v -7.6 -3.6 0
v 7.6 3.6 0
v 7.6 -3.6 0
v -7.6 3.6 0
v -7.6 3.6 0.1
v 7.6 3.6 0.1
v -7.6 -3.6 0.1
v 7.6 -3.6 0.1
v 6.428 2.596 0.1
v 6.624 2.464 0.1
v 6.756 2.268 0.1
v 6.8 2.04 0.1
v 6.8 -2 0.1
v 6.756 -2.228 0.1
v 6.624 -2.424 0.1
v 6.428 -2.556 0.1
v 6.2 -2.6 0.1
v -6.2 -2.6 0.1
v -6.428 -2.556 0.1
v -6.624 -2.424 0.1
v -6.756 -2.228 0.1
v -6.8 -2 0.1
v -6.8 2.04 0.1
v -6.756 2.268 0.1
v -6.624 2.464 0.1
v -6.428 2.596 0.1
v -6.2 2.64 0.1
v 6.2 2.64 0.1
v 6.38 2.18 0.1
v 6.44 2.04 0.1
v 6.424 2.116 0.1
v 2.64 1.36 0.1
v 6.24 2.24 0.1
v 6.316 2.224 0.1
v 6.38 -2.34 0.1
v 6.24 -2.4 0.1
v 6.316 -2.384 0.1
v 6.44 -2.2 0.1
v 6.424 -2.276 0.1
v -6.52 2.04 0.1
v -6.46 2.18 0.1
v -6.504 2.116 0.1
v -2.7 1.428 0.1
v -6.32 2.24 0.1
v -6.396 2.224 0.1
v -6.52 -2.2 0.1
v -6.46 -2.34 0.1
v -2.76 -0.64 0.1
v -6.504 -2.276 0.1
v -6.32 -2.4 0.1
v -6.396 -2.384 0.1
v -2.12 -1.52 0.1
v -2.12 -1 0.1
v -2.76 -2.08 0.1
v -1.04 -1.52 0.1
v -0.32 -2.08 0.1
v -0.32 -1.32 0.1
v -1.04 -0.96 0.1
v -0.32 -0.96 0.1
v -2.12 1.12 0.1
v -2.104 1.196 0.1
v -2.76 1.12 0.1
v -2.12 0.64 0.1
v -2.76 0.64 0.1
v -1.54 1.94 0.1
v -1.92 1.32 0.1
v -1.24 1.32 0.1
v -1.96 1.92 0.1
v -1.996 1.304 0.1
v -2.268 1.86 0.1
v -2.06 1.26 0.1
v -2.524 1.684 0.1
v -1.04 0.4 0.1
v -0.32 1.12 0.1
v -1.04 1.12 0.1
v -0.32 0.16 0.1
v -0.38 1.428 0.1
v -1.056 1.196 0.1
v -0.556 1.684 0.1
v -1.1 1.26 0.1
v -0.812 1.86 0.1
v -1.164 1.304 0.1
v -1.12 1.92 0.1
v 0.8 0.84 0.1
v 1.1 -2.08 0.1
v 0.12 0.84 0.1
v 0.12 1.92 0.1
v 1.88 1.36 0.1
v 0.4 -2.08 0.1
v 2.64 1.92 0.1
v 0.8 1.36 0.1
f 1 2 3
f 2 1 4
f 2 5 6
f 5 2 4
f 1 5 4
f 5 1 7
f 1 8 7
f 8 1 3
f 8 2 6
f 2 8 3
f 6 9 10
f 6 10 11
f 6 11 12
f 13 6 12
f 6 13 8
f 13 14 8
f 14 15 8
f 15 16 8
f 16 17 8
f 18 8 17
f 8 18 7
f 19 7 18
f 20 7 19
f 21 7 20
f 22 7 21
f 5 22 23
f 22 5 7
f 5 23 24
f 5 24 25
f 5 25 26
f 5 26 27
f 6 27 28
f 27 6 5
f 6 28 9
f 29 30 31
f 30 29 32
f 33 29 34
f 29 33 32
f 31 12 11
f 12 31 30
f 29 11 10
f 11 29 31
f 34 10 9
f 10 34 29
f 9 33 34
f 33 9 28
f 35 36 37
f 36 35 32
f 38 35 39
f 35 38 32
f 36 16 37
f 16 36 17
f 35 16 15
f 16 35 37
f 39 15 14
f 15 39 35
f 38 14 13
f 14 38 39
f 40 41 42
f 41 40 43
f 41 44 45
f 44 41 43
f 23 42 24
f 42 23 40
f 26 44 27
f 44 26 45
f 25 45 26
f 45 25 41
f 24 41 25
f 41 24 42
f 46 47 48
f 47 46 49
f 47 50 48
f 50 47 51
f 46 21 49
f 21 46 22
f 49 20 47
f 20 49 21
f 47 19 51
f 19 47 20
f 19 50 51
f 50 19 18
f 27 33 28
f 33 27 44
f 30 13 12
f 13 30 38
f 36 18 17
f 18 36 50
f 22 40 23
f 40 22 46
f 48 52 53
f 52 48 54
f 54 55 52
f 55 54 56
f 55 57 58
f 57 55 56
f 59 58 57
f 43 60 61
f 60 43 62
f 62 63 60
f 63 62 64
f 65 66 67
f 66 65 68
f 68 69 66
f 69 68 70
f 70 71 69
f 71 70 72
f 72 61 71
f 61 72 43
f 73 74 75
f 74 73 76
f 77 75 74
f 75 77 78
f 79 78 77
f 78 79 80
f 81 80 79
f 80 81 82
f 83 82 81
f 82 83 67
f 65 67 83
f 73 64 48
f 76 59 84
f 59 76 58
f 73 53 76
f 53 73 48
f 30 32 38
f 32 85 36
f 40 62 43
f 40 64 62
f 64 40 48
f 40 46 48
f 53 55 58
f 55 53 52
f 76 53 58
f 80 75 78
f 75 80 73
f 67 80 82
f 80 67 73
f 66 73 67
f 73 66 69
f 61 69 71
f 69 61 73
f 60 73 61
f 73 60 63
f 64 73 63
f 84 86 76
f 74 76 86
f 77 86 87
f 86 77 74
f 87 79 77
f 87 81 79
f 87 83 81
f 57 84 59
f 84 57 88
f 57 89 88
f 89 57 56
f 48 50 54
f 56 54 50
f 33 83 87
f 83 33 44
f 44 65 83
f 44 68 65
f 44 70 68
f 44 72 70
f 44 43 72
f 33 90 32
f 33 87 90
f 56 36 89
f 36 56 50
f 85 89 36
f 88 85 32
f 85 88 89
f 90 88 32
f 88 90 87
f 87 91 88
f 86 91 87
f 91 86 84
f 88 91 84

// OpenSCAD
// file: ../p/box5-12.scad
use <../lib.scad>
function ldraw_lib__box5_12() = [
// 0 Box with 5 Faces without Any Edges
// 0 Name: box5-12.dat
// 0 Author: Chris Dee [cwdee]
// 0 !LDRAW_ORG Primitive UPDATE 2009-02
// 0 !LICENSE Licensed under CC BY 4.0 : see CAreadme.txt
// 
// 0 BFC CERTIFY CCW
  [0,"BFC","CERTIFY"],
  [0,"BFC","CCW"],
// 
// 0 !HISTORY 2009-09-03 [PTadmin] Official Update 2009-02
// 
// 
// 4 16 1 1 1 1 1 -1 -1 1 -1 -1 1 1
  [4,16,1,1,1,1,1,-1,-1,1,-1,-1,1,1],
// 4 16 -1 0 1 1 0 1 1 1 1 -1 1 1
  [4,16,-1,0,1,1,0,1,1,1,1,-1,1,1],
// 4 16 -1 0 -1 -1 0 1 -1 1 1 -1 1 -1
  [4,16,-1,0,-1,-1,0,1,-1,1,1,-1,1,-1],
// 4 16 1 0 -1 -1 0 -1 -1 1 -1 1 1 -1
  [4,16,1,0,-1,-1,0,-1,-1,1,-1,1,1,-1],
// 4 16 1 0 1 1 0 -1 1 1 -1 1 1 1
  [4,16,1,0,1,1,0,-1,1,1,-1,1,1,1],
// 0
];
module ldraw_lib__box5_12(step=0, col=false, unit=2/5, alt=false, line=0.2, solid=!$preview)
    makepoly(ldraw_lib__box5_12(), step=step, col=col, unit=unit, alt=alt, line=line, solid=solid);
ldraw_lib__box5_12(line=0.2);
// main file
use <../lib.scad>
use <../p/box5-12.scad>
function ldraw_lib__4174735f() = [
// 0 Sticker  0.9 x  1.9 with White "27" on Black Background with Silver Outline
// 0 Name: 4174735f.dat
// 0 Author: Gerald Lasser [GeraldLasser]
// 0 !LDRAW_ORG Part UPDATE 2024-04
// 0 !LICENSE Licensed under CC BY 4.0 : see CAreadme.txt
// 
// 0 BFC CERTIFY CCW
  [0,"BFC","CERTIFY"],
  [0,"BFC","CCW"],
// 
// 0 !KEYWORDS santa fe, Set 10020
// 
// 0 !HISTORY 2024-05-28 [OrionP] Official Update 2024-04
// 
// 
// 1 16 0 -0.25 0 19 0 0 0 0.25 0 0 0 9 box5-12.dat
  [1,16,0,-0.25,0,19,0,0,0,0.25,0,0,0,9, ldraw_lib__box5_12()],
// 
// 3 16 19 -.25 9 16.07 -.25 6.49 16.56 -.25 6.16
  [3,16,19,-.25,9,16.07,-.25,6.49,16.56,-.25,6.16],
// 3 16 19 -.25 9 16.56 -.25 6.16 16.89 -.25 5.67
  [3,16,19,-.25,9,16.56,-.25,6.16,16.89,-.25,5.67],
// 3 16 19 -.25 9 16.89 -.25 5.67 17 -.25 5.1
  [3,16,19,-.25,9,16.89,-.25,5.67,17,-.25,5.1],
// 4 16 19 -.25 9 17 -.25 5.1 17 -.25 -5 19 -.25 -9
  [4,16,19,-.25,9,17,-.25,5.1,17,-.25,-5,19,-.25,-9],
// 3 16 17 -.25 -5 16.89 -.25 -5.57 19 -.25 -9
  [3,16,17,-.25,-5,16.89,-.25,-5.57,19,-.25,-9],
// 3 16 16.89 -.25 -5.57 16.56 -.25 -6.06 19 -.25 -9
  [3,16,16.89,-.25,-5.57,16.56,-.25,-6.06,19,-.25,-9],
// 3 16 16.56 -.25 -6.06 16.07 -.25 -6.39 19 -.25 -9
  [3,16,16.56,-.25,-6.06,16.07,-.25,-6.39,19,-.25,-9],
// 3 16 16.07 -.25 -6.39 15.5 -.25 -6.5 19 -.25 -9
  [3,16,16.07,-.25,-6.39,15.5,-.25,-6.5,19,-.25,-9],
// 4 16 19 -.25 -9 15.5 -.25 -6.5 -15.5 -.25 -6.5 -19 -.25 -9
  [4,16,19,-.25,-9,15.5,-.25,-6.5,-15.5,-.25,-6.5,-19,-.25,-9],
// 3 16 -16.07 -.25 -6.39 -19 -.25 -9 -15.5 -.25 -6.5
  [3,16,-16.07,-.25,-6.39,-19,-.25,-9,-15.5,-.25,-6.5],
// 3 16 -16.56 -.25 -6.06 -19 -.25 -9 -16.07 -.25 -6.39
  [3,16,-16.56,-.25,-6.06,-19,-.25,-9,-16.07,-.25,-6.39],
// 3 16 -16.89 -.25 -5.57 -19 -.25 -9 -16.56 -.25 -6.06
  [3,16,-16.89,-.25,-5.57,-19,-.25,-9,-16.56,-.25,-6.06],
// 3 16 -17 -.25 -5 -19 -.25 -9 -16.89 -.25 -5.57
  [3,16,-17,-.25,-5,-19,-.25,-9,-16.89,-.25,-5.57],
// 4 16 -19 -.25 -9 -17 -.25 -5 -17 -.25 5.1 -19 -.25 9
  [4,16,-19,-.25,-9,-17,-.25,-5,-17,-.25,5.1,-19,-.25,9],
// 3 16 -19 -.25 9 -17 -.25 5.1 -16.89 -.25 5.67
  [3,16,-19,-.25,9,-17,-.25,5.1,-16.89,-.25,5.67],
// 3 16 -19 -.25 9 -16.89 -.25 5.67 -16.56 -.25 6.16
  [3,16,-19,-.25,9,-16.89,-.25,5.67,-16.56,-.25,6.16],
// 3 16 -19 -.25 9 -16.56 -.25 6.16 -16.07 -.25 6.49
  [3,16,-19,-.25,9,-16.56,-.25,6.16,-16.07,-.25,6.49],
// 3 16 -19 -.25 9 -16.07 -.25 6.49 -15.5 -.25 6.6
  [3,16,-19,-.25,9,-16.07,-.25,6.49,-15.5,-.25,6.6],
// 4 16 19 -.25 9 -19 -.25 9 -15.5 -.25 6.6 15.5 -.25 6.6
  [4,16,19,-.25,9,-19,-.25,9,-15.5,-.25,6.6,15.5,-.25,6.6],
// 3 16 19 -.25 9 15.5 -.25 6.6 16.07 -.25 6.49
  [3,16,19,-.25,9,15.5,-.25,6.6,16.07,-.25,6.49],
// 
// 0 BFC NOCLIP
  [0,"BFC","NOCLIP"],
// 4 0 6.6 -.25 3.4 16.1 -.25 5.1 16.06 -.25 5.29 15.95 -.25 5.45
  [4,0,6.6,-.25,3.4,16.1,-.25,5.1,16.06,-.25,5.29,15.95,-.25,5.45],
// 4 0 6.6 -.25 3.4 15.95 -.25 5.45 15.79 -.25 5.56 15.6 -.25 5.6
  [4,0,6.6,-.25,3.4,15.95,-.25,5.45,15.79,-.25,5.56,15.6,-.25,5.6],
// 4 80 16.06 -.25 5.29 16.1 -.25 5.1 17 -.25 5.1 16.89 -.25 5.67
  [4,80,16.06,-.25,5.29,16.1,-.25,5.1,17,-.25,5.1,16.89,-.25,5.67],
// 4 80 15.95 -.25 5.45 16.06 -.25 5.29 16.89 -.25 5.67 16.56 -.25 6.16
  [4,80,15.95,-.25,5.45,16.06,-.25,5.29,16.89,-.25,5.67,16.56,-.25,6.16],
// 4 80 15.79 -.25 5.56 15.95 -.25 5.45 16.56 -.25 6.16 16.07 -.25 6.49
  [4,80,15.79,-.25,5.56,15.95,-.25,5.45,16.56,-.25,6.16,16.07,-.25,6.49],
// 4 80 15.6 -.25 5.6 15.79 -.25 5.56 16.07 -.25 6.49 15.5 -.25 6.6
  [4,80,15.6,-.25,5.6,15.79,-.25,5.56,16.07,-.25,6.49,15.5,-.25,6.6],
// 4 0 6.6 -.25 3.4 15.6 -.25 -6 15.79 -.25 -5.96 15.95 -.25 -5.85
  [4,0,6.6,-.25,3.4,15.6,-.25,-6,15.79,-.25,-5.96,15.95,-.25,-5.85],
// 4 0 6.6 -.25 3.4 15.95 -.25 -5.85 16.06 -.25 -5.69 16.1 -.25 -5.5
  [4,0,6.6,-.25,3.4,15.95,-.25,-5.85,16.06,-.25,-5.69,16.1,-.25,-5.5],
// 4 80 15.79 -.25 -5.96 15.6 -.25 -6 15.5 -.25 -6.5 16.07 -.25 -6.39
  [4,80,15.79,-.25,-5.96,15.6,-.25,-6,15.5,-.25,-6.5,16.07,-.25,-6.39],
// 4 80 15.95 -.25 -5.85 15.79 -.25 -5.96 16.07 -.25 -6.39 16.56 -.25 -6.06
  [4,80,15.95,-.25,-5.85,15.79,-.25,-5.96,16.07,-.25,-6.39,16.56,-.25,-6.06],
// 4 80 16.06 -.25 -5.69 15.95 -.25 -5.85 16.56 -.25 -6.06 16.89 -.25 -5.57
  [4,80,16.06,-.25,-5.69,15.95,-.25,-5.85,16.56,-.25,-6.06,16.89,-.25,-5.57],
// 4 80 16.1 -.25 -5.5 16.06 -.25 -5.69 16.89 -.25 -5.57 17 -.25 -5
  [4,80,16.1,-.25,-5.5,16.06,-.25,-5.69,16.89,-.25,-5.57,17,-.25,-5],
// 4 0 -16.26 -.25 5.29 -16.3 -.25 5.1 -6.75 -.25 3.57 -16.15 -.25 5.45
  [4,0,-16.26,-.25,5.29,-16.3,-.25,5.1,-6.75,-.25,3.57,-16.15,-.25,5.45],
// 4 0 -6.75 -.25 3.57 -15.8 -.25 5.6 -15.99 -.25 5.56 -16.15 -.25 5.45
  [4,0,-6.75,-.25,3.57,-15.8,-.25,5.6,-15.99,-.25,5.56,-16.15,-.25,5.45],
// 4 80 -16.3 -.25 5.1 -16.26 -.25 5.29 -16.89 -.25 5.67 -17 -.25 5.1
  [4,80,-16.3,-.25,5.1,-16.26,-.25,5.29,-16.89,-.25,5.67,-17,-.25,5.1],
// 4 80 -15.99 -.25 5.56 -15.8 -.25 5.6 -15.5 -.25 6.6 -16.07 -.25 6.49
  [4,80,-15.99,-.25,5.56,-15.8,-.25,5.6,-15.5,-.25,6.6,-16.07,-.25,6.49],
// 4 80 -16.15 -.25 5.45 -15.99 -.25 5.56 -16.07 -.25 6.49 -16.56 -.25 6.16
  [4,80,-16.15,-.25,5.45,-15.99,-.25,5.56,-16.07,-.25,6.49,-16.56,-.25,6.16],
// 4 80 -16.26 -.25 5.29 -16.15 -.25 5.45 -16.56 -.25 6.16 -16.89 -.25 5.67
  [4,80,-16.26,-.25,5.29,-16.15,-.25,5.45,-16.56,-.25,6.16,-16.89,-.25,5.67],
// 4 0 -6.9 -.25 -1.6 -16.3 -.25 -5.5 -16.26 -.25 -5.69 -16.15 -.25 -5.85
  [4,0,-6.9,-.25,-1.6,-16.3,-.25,-5.5,-16.26,-.25,-5.69,-16.15,-.25,-5.85],
// 4 0 -6.9 -.25 -1.6 -16.15 -.25 -5.85 -15.99 -.25 -5.96 -15.8 -.25 -6
  [4,0,-6.9,-.25,-1.6,-16.15,-.25,-5.85,-15.99,-.25,-5.96,-15.8,-.25,-6],
// 4 80 -16.26 -.25 -5.69 -16.3 -.25 -5.5 -17 -.25 -5 -16.89 -.25 -5.57
  [4,80,-16.26,-.25,-5.69,-16.3,-.25,-5.5,-17,-.25,-5,-16.89,-.25,-5.57],
// 4 80 -16.15 -.25 -5.85 -16.26 -.25 -5.69 -16.89 -.25 -5.57 -16.56 -.25 -6.06
  [4,80,-16.15,-.25,-5.85,-16.26,-.25,-5.69,-16.89,-.25,-5.57,-16.56,-.25,-6.06],
// 4 80 -15.99 -.25 -5.96 -16.15 -.25 -5.85 -16.56 -.25 -6.06 -16.07 -.25 -6.39
  [4,80,-15.99,-.25,-5.96,-16.15,-.25,-5.85,-16.56,-.25,-6.06,-16.07,-.25,-6.39],
// 4 80 -15.8 -.25 -6 -15.99 -.25 -5.96 -16.07 -.25 -6.39 -15.5 -.25 -6.5
  [4,80,-15.8,-.25,-6,-15.99,-.25,-5.96,-16.07,-.25,-6.39,-15.5,-.25,-6.5],
// 4 80 15.5 -.25 6.6 -15.5 -.25 6.6 -15.8 -.25 5.6 15.6 -.25 5.6
  [4,80,15.5,-.25,6.6,-15.5,-.25,6.6,-15.8,-.25,5.6,15.6,-.25,5.6],
// 4 80 17 -.25 5.1 16.1 -.25 5.1 16.1 -.25 -5.5 17 -.25 -5
  [4,80,17,-.25,5.1,16.1,-.25,5.1,16.1,-.25,-5.5,17,-.25,-5],
// 4 80 15.5 -.25 -6.5 15.6 -.25 -6 -15.8 -.25 -6 -15.5 -.25 -6.5
  [4,80,15.5,-.25,-6.5,15.6,-.25,-6,-15.8,-.25,-6,-15.5,-.25,-6.5],
// 4 80 -17 -.25 -5 -16.3 -.25 -5.5 -16.3 -.25 5.1 -17 -.25 5.1
  [4,80,-17,-.25,-5,-16.3,-.25,-5.5,-16.3,-.25,5.1,-17,-.25,5.1],
// 4 15 -5.3 -.25 -3.8 -5.3 -.25 -2.5 -6.9 -.25 -1.6 -6.9 -.25 -5.2
  [4,15,-5.3,-.25,-3.8,-5.3,-.25,-2.5,-6.9,-.25,-1.6,-6.9,-.25,-5.2],
// 4 15 -5.3 -.25 -3.8 -6.9 -.25 -5.2 -.8 -.25 -5.2 -2.6 -.25 -3.8
  [4,15,-5.3,-.25,-3.8,-6.9,-.25,-5.2,-.8,-.25,-5.2,-2.6,-.25,-3.8],
// 4 15 -2.6 -.25 -3.8 -.8 -.25 -5.2 -.8 -.25 -3.3 -2.6 -.25 -2.4
  [4,15,-2.6,-.25,-3.8,-.8,-.25,-5.2,-.8,-.25,-3.3,-2.6,-.25,-2.4],
// 3 15 -.8 -.25 -2.4 -2.6 -.25 -2.4 -.8 -.25 -3.3
  [3,15,-.8,-.25,-2.4,-2.6,-.25,-2.4,-.8,-.25,-3.3],
// 4 15 -5.3 -.25 2.8 -5.26 -.25 2.99 -6.75 -.25 3.57 -6.9 -.25 2.8
  [4,15,-5.3,-.25,2.8,-5.26,-.25,2.99,-6.75,-.25,3.57,-6.9,-.25,2.8],
// 4 15 -5.3 -.25 1.6 -5.3 -.25 2.8 -6.9 -.25 2.8 -6.9 -.25 1.6
  [4,15,-5.3,-.25,1.6,-5.3,-.25,2.8,-6.9,-.25,2.8,-6.9,-.25,1.6],
// 4 15 -4.8 -.25 3.3 -3.1 -.25 3.3 -3.85 -.25 4.85 -4.9 -.25 4.8
  [4,15,-4.8,-.25,3.3,-3.1,-.25,3.3,-3.85,-.25,4.85,-4.9,-.25,4.8],
// 4 15 -4.99 -.25 3.26 -4.8 -.25 3.3 -4.9 -.25 4.8 -5.67 -.25 4.65
  [4,15,-4.99,-.25,3.26,-4.8,-.25,3.3,-4.9,-.25,4.8,-5.67,-.25,4.65],
// 4 15 -5.15 -.25 3.15 -4.99 -.25 3.26 -5.67 -.25 4.65 -6.31 -.25 4.21
  [4,15,-5.15,-.25,3.15,-4.99,-.25,3.26,-5.67,-.25,4.65,-6.31,-.25,4.21],
// 4 15 -5.26 -.25 2.99 -5.15 -.25 3.15 -6.31 -.25 4.21 -6.75 -.25 3.57
  [4,15,-5.26,-.25,2.99,-5.15,-.25,3.15,-6.31,-.25,4.21,-6.75,-.25,3.57],
// 4 15 -2.6 -.25 2.8 -2.6 -.25 1 -.8 -.25 .4 -.8 -.25 2.8
  [4,15,-2.6,-.25,2.8,-2.6,-.25,1,-.8,-.25,.4,-.8,-.25,2.8],
// 4 15 -2.64 -.25 2.99 -2.6 -.25 2.8 -.8 -.25 2.8 -.95 -.25 3.57
  [4,15,-2.64,-.25,2.99,-2.6,-.25,2.8,-.8,-.25,2.8,-.95,-.25,3.57],
// 4 15 -2.75 -.25 3.15 -2.64 -.25 2.99 -.95 -.25 3.57 -1.39 -.25 4.21
  [4,15,-2.75,-.25,3.15,-2.64,-.25,2.99,-.95,-.25,3.57,-1.39,-.25,4.21],
// 4 15 -2.91 -.25 3.26 -2.75 -.25 3.15 -1.39 -.25 4.21 -2.03 -.25 4.65
  [4,15,-2.91,-.25,3.26,-2.75,-.25,3.15,-1.39,-.25,4.21,-2.03,-.25,4.65],
// 4 15 -3.1 -.25 3.3 -2.91 -.25 3.26 -2.03 -.25 4.65 -2.8 -.25 4.8
  [4,15,-3.1,-.25,3.3,-2.91,-.25,3.26,-2.03,-.25,4.65,-2.8,-.25,4.8],
// 3 15 -3.85 -.25 4.85 -3.1 -.25 3.3 -2.8 -.25 4.8
  [3,15,-3.85,-.25,4.85,-3.1,-.25,3.3,-2.8,-.25,4.8],
// 3 0 -2.6 -.25 1 -6.9 -.25 1.6 -6.9 -.25 -1.6
  [3,0,-2.6,-.25,1,-6.9,-.25,1.6,-6.9,-.25,-1.6],
// 4 0 -.8 -.25 .4 -2.6 -.25 -2.4 -.8 -.25 -2.4 2 -.25 2.1
  [4,0,-.8,-.25,.4,-2.6,-.25,-2.4,-.8,-.25,-2.4,2,-.25,2.1],
// 4 15 -.8 -.25 .4 -2.6 -.25 1 -6.9 -.25 -1.6 -5.3 -.25 -2.5
  [4,15,-.8,-.25,.4,-2.6,-.25,1,-6.9,-.25,-1.6,-5.3,-.25,-2.5],
// 3 0 16.1 -.25 5.1 6.6 -.25 3.4 16.1 -.25 -5.5
  [3,0,16.1,-.25,5.1,6.6,-.25,3.4,16.1,-.25,-5.5],
// 3 0 6.6 -.25 3.4 2.75 -.25 -5.2 15.6 -.25 -6
  [3,0,6.6,-.25,3.4,2.75,-.25,-5.2,15.6,-.25,-6],
// 3 0 -16.3 -.25 5.1 -6.9 -.25 2.8 -6.75 -.25 3.57
  [3,0,-16.3,-.25,5.1,-6.9,-.25,2.8,-6.75,-.25,3.57],
// 3 0 -16.3 -.25 5.1 -6.9 -.25 1.6 -6.9 -.25 2.8
  [3,0,-16.3,-.25,5.1,-6.9,-.25,1.6,-6.9,-.25,2.8],
// 3 0 -6.9 -.25 1.6 -16.3 -.25 5.1 -6.9 -.25 -1.6
  [3,0,-6.9,-.25,1.6,-16.3,-.25,5.1,-6.9,-.25,-1.6],
// 3 0 -16.3 -.25 5.1 -16.3 -.25 -5.5 -6.9 -.25 -1.6
  [3,0,-16.3,-.25,5.1,-16.3,-.25,-5.5,-6.9,-.25,-1.6],
// 4 0 -5.3 -.25 -3.8 -2.6 -.25 -3.8 -2.6 -.25 -2.4 -5.3 -.25 -2.5
  [4,0,-5.3,-.25,-3.8,-2.6,-.25,-3.8,-2.6,-.25,-2.4,-5.3,-.25,-2.5],
// 3 0 -.8 -.25 .4 -5.3 -.25 -2.5 -2.6 -.25 -2.4
  [3,0,-.8,-.25,.4,-5.3,-.25,-2.5,-2.6,-.25,-2.4],
// 4 0 -2.6 -.25 1 -2.6 -.25 2.8 -2.64 -.25 2.99 -2.75 -.25 3.15
  [4,0,-2.6,-.25,1,-2.6,-.25,2.8,-2.64,-.25,2.99,-2.75,-.25,3.15],
// 4 0 -2.6 -.25 1 -2.75 -.25 3.15 -2.91 -.25 3.26 -3.1 -.25 3.3
  [4,0,-2.6,-.25,1,-2.75,-.25,3.15,-2.91,-.25,3.26,-3.1,-.25,3.3],
// 4 0 -2.6 -.25 1 -3.1 -.25 3.3 -4.8 -.25 3.3 -4.99 -.25 3.26
  [4,0,-2.6,-.25,1,-3.1,-.25,3.3,-4.8,-.25,3.3,-4.99,-.25,3.26],
// 4 0 -2.6 -.25 1 -4.99 -.25 3.26 -5.15 -.25 3.15 -5.26 -.25 2.99
  [4,0,-2.6,-.25,1,-4.99,-.25,3.26,-5.15,-.25,3.15,-5.26,-.25,2.99],
// 4 0 -2.6 -.25 1 -5.26 -.25 2.99 -5.3 -.25 2.8 -5.3 -.25 1.6
  [4,0,-2.6,-.25,1,-5.26,-.25,2.99,-5.3,-.25,2.8,-5.3,-.25,1.6],
// 3 0 -6.9 -.25 1.6 -2.6 -.25 1 -5.3 -.25 1.6
  [3,0,-6.9,-.25,1.6,-2.6,-.25,1,-5.3,-.25,1.6],
// 3 0 2 -.25 2.1 .3 -.25 2.1 -.8 -.25 .4
  [3,0,2,-.25,2.1,.3,-.25,2.1,-.8,-.25,.4],
// 3 0 -.8 -.25 2.8 -.8 -.25 .4 .3 -.25 2.1
  [3,0,-.8,-.25,2.8,-.8,-.25,.4,.3,-.25,2.1],
// 4 0 -.95 -.25 3.57 -.8 -.25 2.8 .3 -.25 2.1 .3 -.25 4.8
  [4,0,-.95,-.25,3.57,-.8,-.25,2.8,.3,-.25,2.1,.3,-.25,4.8],
// 3 0 .3 -.25 4.8 -1.39 -.25 4.21 -.95 -.25 3.57
  [3,0,.3,-.25,4.8,-1.39,-.25,4.21,-.95,-.25,3.57],
// 3 0 .3 -.25 4.8 -2.03 -.25 4.65 -1.39 -.25 4.21
  [3,0,.3,-.25,4.8,-2.03,-.25,4.65,-1.39,-.25,4.21],
// 3 0 .3 -.25 4.8 -2.8 -.25 4.8 -2.03 -.25 4.65
  [3,0,.3,-.25,4.8,-2.8,-.25,4.8,-2.03,-.25,4.65],
// 4 0 4.7 -.25 3.4 2 -.25 2.1 -.8 -.25 -2.4 -.8 -.25 -3.3
  [4,0,4.7,-.25,3.4,2,-.25,2.1,-.8,-.25,-2.4,-.8,-.25,-3.3],
// 4 0 4.7 -.25 3.4 -.8 -.25 -3.3 -.8 -.25 -5.2 1 -.25 -5.2
  [4,0,4.7,-.25,3.4,-.8,-.25,-3.3,-.8,-.25,-5.2,1,-.25,-5.2],
// 3 0 -6.9 -.25 -1.6 -15.8 -.25 -6 -6.9 -.25 -5.2
  [3,0,-6.9,-.25,-1.6,-15.8,-.25,-6,-6.9,-.25,-5.2],
// 3 0 -.8 -.25 -5.2 -6.9 -.25 -5.2 -15.8 -.25 -6
  [3,0,-.8,-.25,-5.2,-6.9,-.25,-5.2,-15.8,-.25,-6],
// 4 0 .3 -.25 4.8 15.6 -.25 5.6 -15.8 -.25 5.6 -2.8 -.25 4.8
  [4,0,.3,-.25,4.8,15.6,-.25,5.6,-15.8,-.25,5.6,-2.8,-.25,4.8],
// 3 0 -15.8 -.25 5.6 -3.85 -.25 4.85 -2.8 -.25 4.8
  [3,0,-15.8,-.25,5.6,-3.85,-.25,4.85,-2.8,-.25,4.8],
// 3 0 -15.8 -.25 5.6 -4.9 -.25 4.8 -3.85 -.25 4.85
  [3,0,-15.8,-.25,5.6,-4.9,-.25,4.8,-3.85,-.25,4.85],
// 3 0 -15.8 -.25 5.6 -5.67 -.25 4.65 -4.9 -.25 4.8
  [3,0,-15.8,-.25,5.6,-5.67,-.25,4.65,-4.9,-.25,4.8],
// 3 0 -15.8 -.25 5.6 -6.31 -.25 4.21 -5.67 -.25 4.65
  [3,0,-15.8,-.25,5.6,-6.31,-.25,4.21,-5.67,-.25,4.65],
// 3 0 -15.8 -.25 5.6 -6.75 -.25 3.57 -6.31 -.25 4.21
  [3,0,-15.8,-.25,5.6,-6.75,-.25,3.57,-6.31,-.25,4.21],
// 3 0 15.6 -.25 5.6 6.6 -.25 4.8 6.6 -.25 3.4
  [3,0,15.6,-.25,5.6,6.6,-.25,4.8,6.6,-.25,3.4],
// 3 0 15.6 -.25 5.6 .3 -.25 4.8 6.6 -.25 4.8
  [3,0,15.6,-.25,5.6,.3,-.25,4.8,6.6,-.25,4.8],
// 4 0 1 -.25 -5.2 -.8 -.25 -5.2 -15.8 -.25 -6 15.6 -.25 -6
  [4,0,1,-.25,-5.2,-.8,-.25,-5.2,-15.8,-.25,-6,15.6,-.25,-6],
// 3 0 2.75 -.25 -5.2 1 -.25 -5.2 15.6 -.25 -6
  [3,0,2.75,-.25,-5.2,1,-.25,-5.2,15.6,-.25,-6],
// 4 15 4.7 -.25 3.4 1 -.25 -5.2 2.75 -.25 -5.2 6.6 -.25 3.4
  [4,15,4.7,-.25,3.4,1,-.25,-5.2,2.75,-.25,-5.2,6.6,-.25,3.4],
// 4 15 4.7 -.25 3.4 6.6 -.25 3.4 6.6 -.25 4.8 .3 -.25 4.8
  [4,15,4.7,-.25,3.4,6.6,-.25,3.4,6.6,-.25,4.8,.3,-.25,4.8],
// 3 15 .3 -.25 4.8 2 -.25 3.4 4.7 -.25 3.4
  [3,15,.3,-.25,4.8,2,-.25,3.4,4.7,-.25,3.4],
// 4 15 2 -.25 3.4 .3 -.25 4.8 .3 -.25 2.1 2 -.25 2.1
  [4,15,2,-.25,3.4,.3,-.25,4.8,.3,-.25,2.1,2,-.25,2.1],
// 3 0 4.7 -.25 3.4 2 -.25 3.4 2 -.25 2.1
  [3,0,4.7,-.25,3.4,2,-.25,3.4,2,-.25,2.1],
];
module ldraw_lib__4174735f(step=0, col=false, unit=2/5, alt=false, line=0.2, solid=!$preview)
    makepoly(ldraw_lib__4174735f(), step=step, col=col, unit=unit, alt=alt, line=line, solid=solid);
ldraw_lib__4174735f(line=0.2);
